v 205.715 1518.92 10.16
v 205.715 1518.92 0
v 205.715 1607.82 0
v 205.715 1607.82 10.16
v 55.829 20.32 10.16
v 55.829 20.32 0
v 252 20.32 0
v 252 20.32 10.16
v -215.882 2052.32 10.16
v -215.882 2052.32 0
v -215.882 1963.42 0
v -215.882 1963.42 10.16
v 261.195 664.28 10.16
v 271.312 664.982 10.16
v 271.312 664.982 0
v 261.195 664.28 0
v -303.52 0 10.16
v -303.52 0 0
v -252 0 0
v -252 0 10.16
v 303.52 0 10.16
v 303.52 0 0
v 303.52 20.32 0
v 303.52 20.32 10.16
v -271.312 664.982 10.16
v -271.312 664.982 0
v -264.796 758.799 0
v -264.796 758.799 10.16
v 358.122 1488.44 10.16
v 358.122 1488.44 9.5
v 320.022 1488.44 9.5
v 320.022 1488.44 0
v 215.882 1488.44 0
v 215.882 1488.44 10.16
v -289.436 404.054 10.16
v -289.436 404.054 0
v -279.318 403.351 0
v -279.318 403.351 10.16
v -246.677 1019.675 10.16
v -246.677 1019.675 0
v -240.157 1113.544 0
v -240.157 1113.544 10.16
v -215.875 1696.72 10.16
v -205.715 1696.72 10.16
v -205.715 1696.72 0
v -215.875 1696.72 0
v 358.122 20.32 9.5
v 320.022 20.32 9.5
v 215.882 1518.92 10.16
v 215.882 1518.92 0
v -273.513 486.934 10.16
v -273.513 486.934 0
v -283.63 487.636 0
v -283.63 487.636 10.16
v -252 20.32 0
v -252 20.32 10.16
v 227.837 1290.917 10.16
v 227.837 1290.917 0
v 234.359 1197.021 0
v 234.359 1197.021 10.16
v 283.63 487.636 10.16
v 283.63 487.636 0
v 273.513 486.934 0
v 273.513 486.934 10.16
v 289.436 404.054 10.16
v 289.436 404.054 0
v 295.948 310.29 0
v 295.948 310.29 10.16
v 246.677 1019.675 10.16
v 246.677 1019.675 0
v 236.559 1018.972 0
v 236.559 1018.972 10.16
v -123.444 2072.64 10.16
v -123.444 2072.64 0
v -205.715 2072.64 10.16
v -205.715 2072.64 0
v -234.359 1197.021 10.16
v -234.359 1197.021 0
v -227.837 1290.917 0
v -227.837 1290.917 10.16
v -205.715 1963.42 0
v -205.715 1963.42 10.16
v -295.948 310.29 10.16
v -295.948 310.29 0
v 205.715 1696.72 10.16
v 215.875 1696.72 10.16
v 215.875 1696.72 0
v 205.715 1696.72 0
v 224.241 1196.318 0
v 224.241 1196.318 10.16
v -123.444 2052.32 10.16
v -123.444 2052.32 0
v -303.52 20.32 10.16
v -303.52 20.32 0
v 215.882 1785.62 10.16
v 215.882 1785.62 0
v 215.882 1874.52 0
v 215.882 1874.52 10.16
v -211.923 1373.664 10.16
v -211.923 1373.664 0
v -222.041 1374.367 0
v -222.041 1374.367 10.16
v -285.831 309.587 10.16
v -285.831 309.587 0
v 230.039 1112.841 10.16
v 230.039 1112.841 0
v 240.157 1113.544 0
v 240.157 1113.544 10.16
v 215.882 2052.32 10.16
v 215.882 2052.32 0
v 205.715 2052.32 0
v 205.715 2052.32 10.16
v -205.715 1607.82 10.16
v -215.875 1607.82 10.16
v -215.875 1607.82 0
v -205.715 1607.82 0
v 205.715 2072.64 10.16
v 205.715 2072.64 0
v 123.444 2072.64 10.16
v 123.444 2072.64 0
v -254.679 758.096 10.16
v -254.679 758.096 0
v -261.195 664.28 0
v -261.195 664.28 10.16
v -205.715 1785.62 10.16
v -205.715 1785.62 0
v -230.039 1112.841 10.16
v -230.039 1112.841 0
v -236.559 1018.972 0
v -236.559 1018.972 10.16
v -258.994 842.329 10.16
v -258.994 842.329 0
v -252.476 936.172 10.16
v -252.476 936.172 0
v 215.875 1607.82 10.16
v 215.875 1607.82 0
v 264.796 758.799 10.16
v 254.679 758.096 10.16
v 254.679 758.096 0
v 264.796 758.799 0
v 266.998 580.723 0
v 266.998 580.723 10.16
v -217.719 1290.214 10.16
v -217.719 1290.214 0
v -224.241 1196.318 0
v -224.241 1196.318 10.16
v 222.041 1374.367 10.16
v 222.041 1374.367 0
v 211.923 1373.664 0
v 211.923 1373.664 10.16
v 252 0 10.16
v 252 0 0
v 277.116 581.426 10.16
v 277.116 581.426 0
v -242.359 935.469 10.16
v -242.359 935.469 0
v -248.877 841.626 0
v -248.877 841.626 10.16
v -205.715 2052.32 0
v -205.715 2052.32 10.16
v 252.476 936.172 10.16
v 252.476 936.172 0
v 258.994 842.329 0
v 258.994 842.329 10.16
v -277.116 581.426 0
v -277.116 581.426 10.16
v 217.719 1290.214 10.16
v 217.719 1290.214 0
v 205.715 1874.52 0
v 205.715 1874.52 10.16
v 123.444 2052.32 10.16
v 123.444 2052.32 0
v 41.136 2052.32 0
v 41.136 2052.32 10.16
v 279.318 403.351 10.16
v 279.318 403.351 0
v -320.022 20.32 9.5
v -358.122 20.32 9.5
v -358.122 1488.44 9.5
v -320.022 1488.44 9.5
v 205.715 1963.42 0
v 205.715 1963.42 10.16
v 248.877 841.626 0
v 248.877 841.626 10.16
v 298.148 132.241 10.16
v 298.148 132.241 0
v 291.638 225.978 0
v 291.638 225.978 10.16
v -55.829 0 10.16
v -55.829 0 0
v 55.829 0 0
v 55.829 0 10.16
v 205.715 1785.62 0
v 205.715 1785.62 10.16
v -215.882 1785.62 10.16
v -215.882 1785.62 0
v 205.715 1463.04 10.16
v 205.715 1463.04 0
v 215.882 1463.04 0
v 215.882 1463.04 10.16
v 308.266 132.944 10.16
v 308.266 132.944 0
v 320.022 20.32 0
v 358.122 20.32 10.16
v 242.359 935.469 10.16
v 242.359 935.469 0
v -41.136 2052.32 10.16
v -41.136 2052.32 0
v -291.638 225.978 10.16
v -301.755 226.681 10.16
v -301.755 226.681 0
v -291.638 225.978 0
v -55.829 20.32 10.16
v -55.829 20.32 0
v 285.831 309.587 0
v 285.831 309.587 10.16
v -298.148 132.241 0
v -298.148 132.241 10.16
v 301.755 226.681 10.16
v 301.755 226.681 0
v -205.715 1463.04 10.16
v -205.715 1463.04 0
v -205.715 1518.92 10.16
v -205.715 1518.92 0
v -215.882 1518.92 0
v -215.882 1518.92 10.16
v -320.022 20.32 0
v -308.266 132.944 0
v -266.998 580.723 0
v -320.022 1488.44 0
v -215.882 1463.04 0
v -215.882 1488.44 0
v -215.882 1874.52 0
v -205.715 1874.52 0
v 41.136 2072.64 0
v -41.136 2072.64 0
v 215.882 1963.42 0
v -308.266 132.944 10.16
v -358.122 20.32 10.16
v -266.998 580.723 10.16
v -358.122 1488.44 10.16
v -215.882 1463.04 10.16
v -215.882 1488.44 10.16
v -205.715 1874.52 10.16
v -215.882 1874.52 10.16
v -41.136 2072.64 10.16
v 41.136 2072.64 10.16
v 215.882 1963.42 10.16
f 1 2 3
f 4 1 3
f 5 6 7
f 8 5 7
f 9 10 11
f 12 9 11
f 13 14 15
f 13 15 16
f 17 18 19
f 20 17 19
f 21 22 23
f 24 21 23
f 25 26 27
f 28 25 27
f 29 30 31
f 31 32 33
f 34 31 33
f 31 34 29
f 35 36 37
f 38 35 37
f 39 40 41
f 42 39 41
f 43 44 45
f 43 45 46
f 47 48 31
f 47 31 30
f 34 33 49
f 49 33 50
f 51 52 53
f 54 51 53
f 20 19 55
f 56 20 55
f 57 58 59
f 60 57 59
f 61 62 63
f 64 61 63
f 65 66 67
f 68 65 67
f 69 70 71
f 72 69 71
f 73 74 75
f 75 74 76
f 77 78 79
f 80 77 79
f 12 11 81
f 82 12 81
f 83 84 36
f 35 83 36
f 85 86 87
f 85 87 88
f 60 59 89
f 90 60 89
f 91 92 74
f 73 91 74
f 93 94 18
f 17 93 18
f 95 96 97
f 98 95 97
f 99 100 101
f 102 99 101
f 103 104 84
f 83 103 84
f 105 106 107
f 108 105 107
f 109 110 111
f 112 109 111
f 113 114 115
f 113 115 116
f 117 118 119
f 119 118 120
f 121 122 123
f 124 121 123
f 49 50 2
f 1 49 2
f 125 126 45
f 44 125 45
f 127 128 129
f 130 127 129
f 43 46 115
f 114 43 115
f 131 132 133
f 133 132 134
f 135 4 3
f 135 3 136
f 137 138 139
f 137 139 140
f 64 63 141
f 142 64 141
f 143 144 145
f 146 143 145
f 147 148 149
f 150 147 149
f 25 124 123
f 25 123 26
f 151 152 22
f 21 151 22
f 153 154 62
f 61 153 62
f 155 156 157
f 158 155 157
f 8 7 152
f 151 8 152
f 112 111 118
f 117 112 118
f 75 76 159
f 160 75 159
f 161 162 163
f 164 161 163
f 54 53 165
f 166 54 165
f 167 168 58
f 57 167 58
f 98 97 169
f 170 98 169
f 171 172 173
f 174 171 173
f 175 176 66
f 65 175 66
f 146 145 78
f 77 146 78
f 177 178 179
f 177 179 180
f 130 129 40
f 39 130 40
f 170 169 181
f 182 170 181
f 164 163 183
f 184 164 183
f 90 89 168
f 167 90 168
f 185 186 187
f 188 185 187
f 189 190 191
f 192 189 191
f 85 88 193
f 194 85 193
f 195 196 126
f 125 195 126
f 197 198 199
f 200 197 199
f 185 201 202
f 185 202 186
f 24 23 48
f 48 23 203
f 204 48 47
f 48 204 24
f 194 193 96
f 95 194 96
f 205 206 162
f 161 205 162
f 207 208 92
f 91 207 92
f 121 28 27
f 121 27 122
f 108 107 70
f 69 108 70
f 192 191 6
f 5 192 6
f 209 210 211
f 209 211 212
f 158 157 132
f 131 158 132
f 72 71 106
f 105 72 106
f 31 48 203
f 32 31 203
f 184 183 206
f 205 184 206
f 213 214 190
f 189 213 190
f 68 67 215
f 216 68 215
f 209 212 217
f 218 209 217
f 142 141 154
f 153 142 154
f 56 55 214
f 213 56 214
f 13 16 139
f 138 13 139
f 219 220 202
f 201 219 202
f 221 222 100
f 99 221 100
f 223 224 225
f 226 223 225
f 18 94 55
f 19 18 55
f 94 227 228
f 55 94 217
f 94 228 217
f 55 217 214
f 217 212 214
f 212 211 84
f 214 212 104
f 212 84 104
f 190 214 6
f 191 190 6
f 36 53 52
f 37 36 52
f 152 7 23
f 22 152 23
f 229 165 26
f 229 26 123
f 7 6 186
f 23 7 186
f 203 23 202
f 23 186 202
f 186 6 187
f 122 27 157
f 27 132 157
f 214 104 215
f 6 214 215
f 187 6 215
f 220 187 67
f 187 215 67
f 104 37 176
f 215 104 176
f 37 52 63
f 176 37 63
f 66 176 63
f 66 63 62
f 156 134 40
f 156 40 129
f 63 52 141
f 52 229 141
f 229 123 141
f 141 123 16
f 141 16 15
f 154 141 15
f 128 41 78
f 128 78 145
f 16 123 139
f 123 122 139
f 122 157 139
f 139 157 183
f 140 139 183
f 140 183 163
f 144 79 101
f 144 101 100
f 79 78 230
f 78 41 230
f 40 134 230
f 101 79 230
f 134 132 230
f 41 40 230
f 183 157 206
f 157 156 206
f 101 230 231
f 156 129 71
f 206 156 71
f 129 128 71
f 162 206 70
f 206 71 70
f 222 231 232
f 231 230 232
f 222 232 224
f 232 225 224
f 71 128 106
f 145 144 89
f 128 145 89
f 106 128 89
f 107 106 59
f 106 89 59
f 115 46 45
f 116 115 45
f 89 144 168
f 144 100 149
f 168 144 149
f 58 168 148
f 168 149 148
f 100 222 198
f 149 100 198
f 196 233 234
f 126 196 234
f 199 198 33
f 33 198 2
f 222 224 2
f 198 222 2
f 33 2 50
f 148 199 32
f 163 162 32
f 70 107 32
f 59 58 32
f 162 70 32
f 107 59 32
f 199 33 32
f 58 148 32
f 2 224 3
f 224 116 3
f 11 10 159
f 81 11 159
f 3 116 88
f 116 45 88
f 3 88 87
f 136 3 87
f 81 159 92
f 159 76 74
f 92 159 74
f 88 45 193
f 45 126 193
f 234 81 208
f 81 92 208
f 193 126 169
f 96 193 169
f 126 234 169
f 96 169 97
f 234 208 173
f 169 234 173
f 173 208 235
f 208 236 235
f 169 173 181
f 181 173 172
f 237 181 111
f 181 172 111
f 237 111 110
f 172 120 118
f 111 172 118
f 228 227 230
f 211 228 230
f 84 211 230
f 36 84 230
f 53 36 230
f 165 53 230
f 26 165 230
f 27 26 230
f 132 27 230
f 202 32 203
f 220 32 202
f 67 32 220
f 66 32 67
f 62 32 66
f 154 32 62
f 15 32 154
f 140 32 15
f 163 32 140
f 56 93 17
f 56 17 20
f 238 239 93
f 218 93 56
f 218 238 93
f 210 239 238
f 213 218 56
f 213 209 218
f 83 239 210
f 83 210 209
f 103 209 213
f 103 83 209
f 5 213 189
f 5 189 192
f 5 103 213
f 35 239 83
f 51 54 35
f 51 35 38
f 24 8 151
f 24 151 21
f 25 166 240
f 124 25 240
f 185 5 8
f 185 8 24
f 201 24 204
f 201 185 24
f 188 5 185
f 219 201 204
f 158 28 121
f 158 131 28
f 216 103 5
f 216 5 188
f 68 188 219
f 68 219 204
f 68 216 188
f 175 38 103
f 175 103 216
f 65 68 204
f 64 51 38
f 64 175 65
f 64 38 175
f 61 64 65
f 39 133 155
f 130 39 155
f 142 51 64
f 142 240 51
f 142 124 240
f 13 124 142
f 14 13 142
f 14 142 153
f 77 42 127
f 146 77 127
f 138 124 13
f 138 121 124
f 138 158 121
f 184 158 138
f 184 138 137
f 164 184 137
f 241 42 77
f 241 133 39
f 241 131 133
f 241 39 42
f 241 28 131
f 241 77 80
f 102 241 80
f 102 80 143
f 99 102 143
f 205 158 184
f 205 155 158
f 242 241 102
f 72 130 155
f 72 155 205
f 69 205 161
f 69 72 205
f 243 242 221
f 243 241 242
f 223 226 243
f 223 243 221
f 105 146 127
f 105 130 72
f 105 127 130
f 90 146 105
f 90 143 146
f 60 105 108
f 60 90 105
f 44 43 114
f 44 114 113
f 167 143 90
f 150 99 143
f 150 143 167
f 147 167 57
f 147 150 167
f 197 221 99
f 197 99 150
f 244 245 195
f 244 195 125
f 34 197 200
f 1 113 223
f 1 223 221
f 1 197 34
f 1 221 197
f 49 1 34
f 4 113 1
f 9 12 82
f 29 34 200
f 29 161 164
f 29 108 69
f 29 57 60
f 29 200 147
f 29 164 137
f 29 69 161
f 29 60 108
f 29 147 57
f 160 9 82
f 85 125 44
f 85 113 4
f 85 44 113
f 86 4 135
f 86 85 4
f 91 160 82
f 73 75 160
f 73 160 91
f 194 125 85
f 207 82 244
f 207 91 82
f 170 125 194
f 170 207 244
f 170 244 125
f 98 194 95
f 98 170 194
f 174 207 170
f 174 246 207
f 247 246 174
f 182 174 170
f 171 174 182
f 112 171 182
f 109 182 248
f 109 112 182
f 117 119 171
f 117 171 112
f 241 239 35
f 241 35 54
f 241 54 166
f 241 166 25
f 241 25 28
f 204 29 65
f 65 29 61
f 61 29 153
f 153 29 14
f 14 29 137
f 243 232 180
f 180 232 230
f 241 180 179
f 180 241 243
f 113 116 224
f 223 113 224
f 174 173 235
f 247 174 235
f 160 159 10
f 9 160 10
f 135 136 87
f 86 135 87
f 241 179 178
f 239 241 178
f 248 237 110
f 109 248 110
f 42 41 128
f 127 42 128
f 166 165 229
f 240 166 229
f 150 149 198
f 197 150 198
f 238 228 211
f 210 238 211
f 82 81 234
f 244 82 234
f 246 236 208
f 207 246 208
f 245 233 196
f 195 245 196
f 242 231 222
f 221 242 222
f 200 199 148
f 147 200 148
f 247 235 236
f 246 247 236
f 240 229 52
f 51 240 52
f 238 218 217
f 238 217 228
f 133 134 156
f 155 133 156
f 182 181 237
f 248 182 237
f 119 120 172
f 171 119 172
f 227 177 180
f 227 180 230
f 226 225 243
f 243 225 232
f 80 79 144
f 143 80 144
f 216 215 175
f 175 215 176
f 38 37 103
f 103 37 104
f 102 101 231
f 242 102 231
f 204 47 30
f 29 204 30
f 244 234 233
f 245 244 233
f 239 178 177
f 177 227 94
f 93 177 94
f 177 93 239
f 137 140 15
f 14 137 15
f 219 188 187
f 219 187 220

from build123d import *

# Parameters (mm, degrees)
BOSS_EXTRUDE1_DEPTH = 10.16
SKETCH2_W           = 38.1
SKETCH2_H           = 9.5
CUT_EXTRUDE1_DEPTH  = 2540


with BuildPart() as part:
    # Sketch1 → Boss-Extrude1 (new body)
    with BuildSketch(Plane.XY):
        Polygon((-123.444, 2072.64), (-205.715298803, 2072.64), (-205.715298803, 2052.32), (-215.881789204, 2052.32), (-215.881789204, 1963.42), (-205.715298803, 1963.42), (-205.715298803, 1874.52), (-215.881789204, 1874.52), (-215.881789204, 1785.62), (-205.715298803, 1785.62), (-205.715298803, 1696.72), (-215.875298803, 1696.72), (-215.875298803, 1607.82), (-205.715298803, 1607.82), (-205.715298803, 1518.92), (-215.881789204, 1518.92), (-215.881789204, 1488.440000035), (-358.121789204, 1488.440000035), (-358.121789204, 20.32), (-303.52, 20.32), (-303.52, 0), (-252, 0), (-252, 20.32), (-55.8292, 20.32), (-55.8292, 0), (55.8292, 0), (55.8292, 20.32), (252, 20.32), (252, 0), (303.52, 0), (303.52, 20.32), (358.121789204, 20.32), (358.121789204, 1488.440000035), (215.881789204, 1488.440000035), (215.881789204, 1518.92), (205.715298803, 1518.92), (205.715298803, 1607.82), (215.875298803, 1607.82), (215.875298803, 1696.72), (205.715298803, 1696.72), (205.715298803, 1785.62), (215.881789204, 1785.62), (215.881789204, 1874.52), (205.715298803, 1874.52), (205.715298803, 1963.42), (215.881789204, 1963.42), (215.881789204, 2052.32), (205.715298803, 2052.32), (205.715298803, 2072.64), (123.444, 2072.64), (123.444, 2052.32), (41.135649402, 2052.32), (41.135649402, 2072.64), (-41.135649402, 2072.64), (-41.135649402, 2052.32), (-123.444, 2052.32), align=None)
        Polygon((215.881789204, 1463.040000035), (222.040744894, 1374.366931824), (211.92306481, 1373.664189215), (205.715298803, 1463.040000035), align=None, mode=Mode.SUBTRACT)
        Polygon((-205.715298803, 1463.040000035), (-211.92306481, 1373.664189215), (-222.040744894, 1374.366931824), (-215.881789204, 1463.040000035), align=None, mode=Mode.SUBTRACT)
        Polygon((227.836927701, 1290.916856945), (234.358656272, 1197.020795404), (224.240976188, 1196.318052795), (217.719247617, 1290.214114336), align=None, mode=Mode.SUBTRACT)
        Polygon((-308.266124544, 132.94397688), (-301.755453134, 226.680843836), (-291.63777305, 225.978101227), (-298.14844446, 132.241234271), align=None, mode=Mode.SUBTRACT)
        Polygon((-289.435698895, 404.053512688), (-279.318018811, 403.350770078), (-285.830533081, 309.587370692), (-295.948213166, 310.290113301), align=None, mode=Mode.SUBTRACT)
        Polygon((-283.630301787, 487.636249721), (-277.115944656, 581.426181539), (-266.998264572, 580.72343893), (-273.512621703, 486.933507112), align=None, mode=Mode.SUBTRACT)
        Polygon((-264.796190418, 758.798850391), (-254.678510334, 758.096107781), (-261.194710324, 664.279643533), (-271.312390408, 664.982386142), align=None, mode=Mode.SUBTRACT)
        Polygon((-252.476436179, 936.171519242), (-242.358756095, 935.468776633), (-248.876798945, 841.625779953), (-258.99447903, 842.328522563), align=None, mode=Mode.SUBTRACT)
        Polygon((301.755453134, 226.680843836), (308.266124544, 132.94397688), (298.14844446, 132.241234271), (291.63777305, 225.978101227), align=None, mode=Mode.SUBTRACT)
        Polygon((279.318018811, 403.350770078), (289.435698895, 404.053512688), (295.948213166, 310.290113301), (285.830533081, 309.587370692), align=None, mode=Mode.SUBTRACT)
        Polygon((254.678510334, 758.096107781), (264.796190418, 758.798850391), (271.312390408, 664.982386142), (261.194710324, 664.279643533), align=None, mode=Mode.SUBTRACT)
        Polygon((277.115944656, 581.426181539), (283.630301787, 487.636249721), (273.512621703, 486.933507112), (266.998264572, 580.72343893), align=None, mode=Mode.SUBTRACT)
        Polygon((242.358756095, 935.468776633), (252.476436179, 936.171519242), (258.99447903, 842.328522563), (248.876798945, 841.625779953), align=None, mode=Mode.SUBTRACT)
        Polygon((-240.15668194, 1113.544188093), (-230.039001856, 1112.841445484), (-236.558887567, 1018.971916374), (-246.676567651, 1019.674658983), align=None, mode=Mode.SUBTRACT)
        Polygon((-227.836927701, 1290.916856945), (-217.719247617, 1290.214114336), (-224.240976188, 1196.318052795), (-234.358656272, 1197.020795404), align=None, mode=Mode.SUBTRACT)
        Polygon((230.039001856, 1112.841445484), (240.15668194, 1113.544188093), (246.676567651, 1019.674658983), (236.558887567, 1018.971916374), align=None, mode=Mode.SUBTRACT)
    extrude(amount=BOSS_EXTRUDE1_DEPTH)

    # Sketch2 → Cut-Extrude1 (cut)
    with BuildSketch(Plane(origin=(0, 0, 0), x_dir=(1, 0, 0), z_dir=(0, 1, 0))):
        with Locations((339.071789204, -4.75)):
            Rectangle(SKETCH2_W, SKETCH2_H)
        with Locations((-339.071789204, -4.75)):
            Rectangle(SKETCH2_W, SKETCH2_H)
    extrude(amount=CUT_EXTRUDE1_DEPTH, mode=Mode.SUBTRACT)


solid = part.part
